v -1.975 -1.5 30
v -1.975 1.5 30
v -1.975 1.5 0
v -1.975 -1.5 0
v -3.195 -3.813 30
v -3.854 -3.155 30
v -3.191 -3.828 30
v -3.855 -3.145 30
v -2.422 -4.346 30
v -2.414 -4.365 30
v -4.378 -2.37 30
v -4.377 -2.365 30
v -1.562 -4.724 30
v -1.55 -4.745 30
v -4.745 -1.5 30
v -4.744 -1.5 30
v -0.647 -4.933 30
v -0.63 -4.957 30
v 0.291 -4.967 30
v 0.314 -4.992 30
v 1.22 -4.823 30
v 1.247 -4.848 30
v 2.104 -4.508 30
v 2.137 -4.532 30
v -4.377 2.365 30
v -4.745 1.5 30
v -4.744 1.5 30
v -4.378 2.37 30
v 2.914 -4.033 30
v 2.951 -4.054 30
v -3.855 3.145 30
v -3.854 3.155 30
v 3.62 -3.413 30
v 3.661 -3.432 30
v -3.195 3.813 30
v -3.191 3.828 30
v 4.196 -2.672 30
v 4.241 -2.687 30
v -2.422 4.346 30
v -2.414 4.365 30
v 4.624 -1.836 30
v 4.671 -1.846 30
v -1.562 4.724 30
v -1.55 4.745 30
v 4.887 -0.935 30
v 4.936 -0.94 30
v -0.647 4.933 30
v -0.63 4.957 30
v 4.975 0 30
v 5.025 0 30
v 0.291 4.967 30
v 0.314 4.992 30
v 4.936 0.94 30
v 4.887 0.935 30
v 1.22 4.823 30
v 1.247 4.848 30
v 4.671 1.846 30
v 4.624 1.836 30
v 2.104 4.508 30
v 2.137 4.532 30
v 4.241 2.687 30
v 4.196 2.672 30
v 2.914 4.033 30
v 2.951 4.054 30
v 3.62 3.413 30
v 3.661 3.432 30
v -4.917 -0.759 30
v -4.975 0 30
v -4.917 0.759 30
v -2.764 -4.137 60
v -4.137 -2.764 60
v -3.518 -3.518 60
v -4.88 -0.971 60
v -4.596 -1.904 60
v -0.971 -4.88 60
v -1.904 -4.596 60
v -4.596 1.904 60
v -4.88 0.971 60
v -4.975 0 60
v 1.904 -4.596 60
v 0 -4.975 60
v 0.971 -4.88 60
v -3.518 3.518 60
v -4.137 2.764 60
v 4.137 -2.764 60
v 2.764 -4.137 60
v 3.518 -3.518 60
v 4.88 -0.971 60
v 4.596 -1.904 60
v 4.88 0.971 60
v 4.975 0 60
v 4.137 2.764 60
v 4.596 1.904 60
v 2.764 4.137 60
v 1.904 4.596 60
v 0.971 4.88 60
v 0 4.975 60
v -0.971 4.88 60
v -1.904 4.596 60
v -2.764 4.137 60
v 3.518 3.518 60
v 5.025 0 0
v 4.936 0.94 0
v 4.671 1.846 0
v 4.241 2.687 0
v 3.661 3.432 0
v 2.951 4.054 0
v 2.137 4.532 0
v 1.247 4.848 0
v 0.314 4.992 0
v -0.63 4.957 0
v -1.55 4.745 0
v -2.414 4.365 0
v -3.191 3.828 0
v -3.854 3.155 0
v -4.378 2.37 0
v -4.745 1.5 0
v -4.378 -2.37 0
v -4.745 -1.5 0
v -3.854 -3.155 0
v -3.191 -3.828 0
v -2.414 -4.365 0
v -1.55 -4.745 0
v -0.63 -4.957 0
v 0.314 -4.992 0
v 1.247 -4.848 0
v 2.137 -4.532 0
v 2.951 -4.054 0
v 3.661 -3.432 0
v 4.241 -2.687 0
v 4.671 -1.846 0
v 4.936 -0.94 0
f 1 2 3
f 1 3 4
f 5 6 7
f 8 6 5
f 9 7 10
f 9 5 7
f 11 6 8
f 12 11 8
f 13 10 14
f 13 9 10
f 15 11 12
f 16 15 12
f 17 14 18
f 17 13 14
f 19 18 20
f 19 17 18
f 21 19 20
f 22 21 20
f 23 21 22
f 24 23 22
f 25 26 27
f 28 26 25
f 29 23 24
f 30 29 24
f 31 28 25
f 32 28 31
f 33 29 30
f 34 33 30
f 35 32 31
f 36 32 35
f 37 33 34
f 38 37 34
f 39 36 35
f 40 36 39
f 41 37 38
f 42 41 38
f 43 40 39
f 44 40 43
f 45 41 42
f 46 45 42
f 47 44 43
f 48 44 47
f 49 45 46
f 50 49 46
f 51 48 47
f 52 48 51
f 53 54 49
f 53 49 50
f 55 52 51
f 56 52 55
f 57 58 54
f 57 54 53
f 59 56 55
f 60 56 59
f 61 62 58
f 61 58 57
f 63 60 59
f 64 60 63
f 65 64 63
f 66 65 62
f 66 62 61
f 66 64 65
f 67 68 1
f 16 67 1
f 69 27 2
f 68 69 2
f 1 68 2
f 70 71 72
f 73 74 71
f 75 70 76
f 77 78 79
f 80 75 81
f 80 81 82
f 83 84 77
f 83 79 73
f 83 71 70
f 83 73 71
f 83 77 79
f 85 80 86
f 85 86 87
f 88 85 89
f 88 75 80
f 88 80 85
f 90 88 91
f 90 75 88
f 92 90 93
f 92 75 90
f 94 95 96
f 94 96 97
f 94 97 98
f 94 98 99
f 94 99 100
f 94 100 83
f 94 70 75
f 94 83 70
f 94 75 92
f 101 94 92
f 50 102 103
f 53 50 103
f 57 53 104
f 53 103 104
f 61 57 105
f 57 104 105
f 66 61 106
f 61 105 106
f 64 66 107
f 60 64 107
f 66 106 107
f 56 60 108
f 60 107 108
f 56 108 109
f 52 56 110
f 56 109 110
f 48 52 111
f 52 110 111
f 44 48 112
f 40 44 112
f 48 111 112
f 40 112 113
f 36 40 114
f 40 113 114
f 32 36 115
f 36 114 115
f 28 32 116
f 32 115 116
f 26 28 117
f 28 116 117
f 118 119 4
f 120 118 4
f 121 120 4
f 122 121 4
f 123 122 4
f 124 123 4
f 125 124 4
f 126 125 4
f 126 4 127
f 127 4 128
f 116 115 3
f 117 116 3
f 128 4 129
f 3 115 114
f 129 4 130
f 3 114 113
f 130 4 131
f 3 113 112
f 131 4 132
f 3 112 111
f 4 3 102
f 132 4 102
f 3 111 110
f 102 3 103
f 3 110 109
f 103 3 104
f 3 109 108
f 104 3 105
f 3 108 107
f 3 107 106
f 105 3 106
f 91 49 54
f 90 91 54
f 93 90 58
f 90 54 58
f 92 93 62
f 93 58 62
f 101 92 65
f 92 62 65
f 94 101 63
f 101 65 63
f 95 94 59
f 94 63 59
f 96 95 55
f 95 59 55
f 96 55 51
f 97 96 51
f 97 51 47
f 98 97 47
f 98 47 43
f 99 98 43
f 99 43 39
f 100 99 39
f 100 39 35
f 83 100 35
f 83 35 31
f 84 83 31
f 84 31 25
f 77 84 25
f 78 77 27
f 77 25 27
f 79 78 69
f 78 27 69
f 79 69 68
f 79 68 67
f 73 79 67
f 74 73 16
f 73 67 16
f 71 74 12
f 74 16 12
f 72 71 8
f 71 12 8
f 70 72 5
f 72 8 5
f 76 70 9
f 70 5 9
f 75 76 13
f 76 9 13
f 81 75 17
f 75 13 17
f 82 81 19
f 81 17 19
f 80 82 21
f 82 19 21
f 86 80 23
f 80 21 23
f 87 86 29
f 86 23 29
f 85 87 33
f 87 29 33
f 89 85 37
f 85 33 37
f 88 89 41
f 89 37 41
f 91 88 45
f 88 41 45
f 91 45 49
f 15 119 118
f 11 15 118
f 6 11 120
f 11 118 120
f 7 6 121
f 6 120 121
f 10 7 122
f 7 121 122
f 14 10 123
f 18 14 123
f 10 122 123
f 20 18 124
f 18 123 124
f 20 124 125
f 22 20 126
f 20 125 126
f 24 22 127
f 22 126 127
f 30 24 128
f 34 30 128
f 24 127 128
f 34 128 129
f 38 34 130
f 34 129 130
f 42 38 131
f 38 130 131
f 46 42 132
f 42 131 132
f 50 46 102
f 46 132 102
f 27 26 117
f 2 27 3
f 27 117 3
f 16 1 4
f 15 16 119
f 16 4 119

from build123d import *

# Parameters (mm, degrees)
BOSS_EXTRUDE1_DEPTH = 30
SKETCH2_R           = 4.97516062
BOSS_EXTRUDE2_DEPTH = 30


with BuildPart() as part:
    # Sketch1 → Boss-Extrude1 (new body)
    with BuildSketch(Plane.XY):
        with BuildLine():
            Line((-1.97516062, 1.5), (-1.97516062, 0))
            Line((-1.97516062, 0), (-1.97516062, -1.5))
            Line((-1.97516062, -1.5), (-4.744856627, -1.5))
            ThreePointArc((-4.744856627, -1.5), (0.783627877, -4.942088629), (5.02483938, 0))
            ThreePointArc((5.02483938, 0), (0.783627877, 4.942088629), (-4.744856627, 1.5))
            Line((-4.744856627, 1.5), (-1.97516062, 1.5))
        make_face()
    extrude(amount=BOSS_EXTRUDE1_DEPTH)

    # Sketch2 → Boss-Extrude2 (add)
    with BuildSketch(Plane.XY.offset(30)):
        Circle(SKETCH2_R)
    extrude(amount=BOSS_EXTRUDE2_DEPTH)


solid = part.part
